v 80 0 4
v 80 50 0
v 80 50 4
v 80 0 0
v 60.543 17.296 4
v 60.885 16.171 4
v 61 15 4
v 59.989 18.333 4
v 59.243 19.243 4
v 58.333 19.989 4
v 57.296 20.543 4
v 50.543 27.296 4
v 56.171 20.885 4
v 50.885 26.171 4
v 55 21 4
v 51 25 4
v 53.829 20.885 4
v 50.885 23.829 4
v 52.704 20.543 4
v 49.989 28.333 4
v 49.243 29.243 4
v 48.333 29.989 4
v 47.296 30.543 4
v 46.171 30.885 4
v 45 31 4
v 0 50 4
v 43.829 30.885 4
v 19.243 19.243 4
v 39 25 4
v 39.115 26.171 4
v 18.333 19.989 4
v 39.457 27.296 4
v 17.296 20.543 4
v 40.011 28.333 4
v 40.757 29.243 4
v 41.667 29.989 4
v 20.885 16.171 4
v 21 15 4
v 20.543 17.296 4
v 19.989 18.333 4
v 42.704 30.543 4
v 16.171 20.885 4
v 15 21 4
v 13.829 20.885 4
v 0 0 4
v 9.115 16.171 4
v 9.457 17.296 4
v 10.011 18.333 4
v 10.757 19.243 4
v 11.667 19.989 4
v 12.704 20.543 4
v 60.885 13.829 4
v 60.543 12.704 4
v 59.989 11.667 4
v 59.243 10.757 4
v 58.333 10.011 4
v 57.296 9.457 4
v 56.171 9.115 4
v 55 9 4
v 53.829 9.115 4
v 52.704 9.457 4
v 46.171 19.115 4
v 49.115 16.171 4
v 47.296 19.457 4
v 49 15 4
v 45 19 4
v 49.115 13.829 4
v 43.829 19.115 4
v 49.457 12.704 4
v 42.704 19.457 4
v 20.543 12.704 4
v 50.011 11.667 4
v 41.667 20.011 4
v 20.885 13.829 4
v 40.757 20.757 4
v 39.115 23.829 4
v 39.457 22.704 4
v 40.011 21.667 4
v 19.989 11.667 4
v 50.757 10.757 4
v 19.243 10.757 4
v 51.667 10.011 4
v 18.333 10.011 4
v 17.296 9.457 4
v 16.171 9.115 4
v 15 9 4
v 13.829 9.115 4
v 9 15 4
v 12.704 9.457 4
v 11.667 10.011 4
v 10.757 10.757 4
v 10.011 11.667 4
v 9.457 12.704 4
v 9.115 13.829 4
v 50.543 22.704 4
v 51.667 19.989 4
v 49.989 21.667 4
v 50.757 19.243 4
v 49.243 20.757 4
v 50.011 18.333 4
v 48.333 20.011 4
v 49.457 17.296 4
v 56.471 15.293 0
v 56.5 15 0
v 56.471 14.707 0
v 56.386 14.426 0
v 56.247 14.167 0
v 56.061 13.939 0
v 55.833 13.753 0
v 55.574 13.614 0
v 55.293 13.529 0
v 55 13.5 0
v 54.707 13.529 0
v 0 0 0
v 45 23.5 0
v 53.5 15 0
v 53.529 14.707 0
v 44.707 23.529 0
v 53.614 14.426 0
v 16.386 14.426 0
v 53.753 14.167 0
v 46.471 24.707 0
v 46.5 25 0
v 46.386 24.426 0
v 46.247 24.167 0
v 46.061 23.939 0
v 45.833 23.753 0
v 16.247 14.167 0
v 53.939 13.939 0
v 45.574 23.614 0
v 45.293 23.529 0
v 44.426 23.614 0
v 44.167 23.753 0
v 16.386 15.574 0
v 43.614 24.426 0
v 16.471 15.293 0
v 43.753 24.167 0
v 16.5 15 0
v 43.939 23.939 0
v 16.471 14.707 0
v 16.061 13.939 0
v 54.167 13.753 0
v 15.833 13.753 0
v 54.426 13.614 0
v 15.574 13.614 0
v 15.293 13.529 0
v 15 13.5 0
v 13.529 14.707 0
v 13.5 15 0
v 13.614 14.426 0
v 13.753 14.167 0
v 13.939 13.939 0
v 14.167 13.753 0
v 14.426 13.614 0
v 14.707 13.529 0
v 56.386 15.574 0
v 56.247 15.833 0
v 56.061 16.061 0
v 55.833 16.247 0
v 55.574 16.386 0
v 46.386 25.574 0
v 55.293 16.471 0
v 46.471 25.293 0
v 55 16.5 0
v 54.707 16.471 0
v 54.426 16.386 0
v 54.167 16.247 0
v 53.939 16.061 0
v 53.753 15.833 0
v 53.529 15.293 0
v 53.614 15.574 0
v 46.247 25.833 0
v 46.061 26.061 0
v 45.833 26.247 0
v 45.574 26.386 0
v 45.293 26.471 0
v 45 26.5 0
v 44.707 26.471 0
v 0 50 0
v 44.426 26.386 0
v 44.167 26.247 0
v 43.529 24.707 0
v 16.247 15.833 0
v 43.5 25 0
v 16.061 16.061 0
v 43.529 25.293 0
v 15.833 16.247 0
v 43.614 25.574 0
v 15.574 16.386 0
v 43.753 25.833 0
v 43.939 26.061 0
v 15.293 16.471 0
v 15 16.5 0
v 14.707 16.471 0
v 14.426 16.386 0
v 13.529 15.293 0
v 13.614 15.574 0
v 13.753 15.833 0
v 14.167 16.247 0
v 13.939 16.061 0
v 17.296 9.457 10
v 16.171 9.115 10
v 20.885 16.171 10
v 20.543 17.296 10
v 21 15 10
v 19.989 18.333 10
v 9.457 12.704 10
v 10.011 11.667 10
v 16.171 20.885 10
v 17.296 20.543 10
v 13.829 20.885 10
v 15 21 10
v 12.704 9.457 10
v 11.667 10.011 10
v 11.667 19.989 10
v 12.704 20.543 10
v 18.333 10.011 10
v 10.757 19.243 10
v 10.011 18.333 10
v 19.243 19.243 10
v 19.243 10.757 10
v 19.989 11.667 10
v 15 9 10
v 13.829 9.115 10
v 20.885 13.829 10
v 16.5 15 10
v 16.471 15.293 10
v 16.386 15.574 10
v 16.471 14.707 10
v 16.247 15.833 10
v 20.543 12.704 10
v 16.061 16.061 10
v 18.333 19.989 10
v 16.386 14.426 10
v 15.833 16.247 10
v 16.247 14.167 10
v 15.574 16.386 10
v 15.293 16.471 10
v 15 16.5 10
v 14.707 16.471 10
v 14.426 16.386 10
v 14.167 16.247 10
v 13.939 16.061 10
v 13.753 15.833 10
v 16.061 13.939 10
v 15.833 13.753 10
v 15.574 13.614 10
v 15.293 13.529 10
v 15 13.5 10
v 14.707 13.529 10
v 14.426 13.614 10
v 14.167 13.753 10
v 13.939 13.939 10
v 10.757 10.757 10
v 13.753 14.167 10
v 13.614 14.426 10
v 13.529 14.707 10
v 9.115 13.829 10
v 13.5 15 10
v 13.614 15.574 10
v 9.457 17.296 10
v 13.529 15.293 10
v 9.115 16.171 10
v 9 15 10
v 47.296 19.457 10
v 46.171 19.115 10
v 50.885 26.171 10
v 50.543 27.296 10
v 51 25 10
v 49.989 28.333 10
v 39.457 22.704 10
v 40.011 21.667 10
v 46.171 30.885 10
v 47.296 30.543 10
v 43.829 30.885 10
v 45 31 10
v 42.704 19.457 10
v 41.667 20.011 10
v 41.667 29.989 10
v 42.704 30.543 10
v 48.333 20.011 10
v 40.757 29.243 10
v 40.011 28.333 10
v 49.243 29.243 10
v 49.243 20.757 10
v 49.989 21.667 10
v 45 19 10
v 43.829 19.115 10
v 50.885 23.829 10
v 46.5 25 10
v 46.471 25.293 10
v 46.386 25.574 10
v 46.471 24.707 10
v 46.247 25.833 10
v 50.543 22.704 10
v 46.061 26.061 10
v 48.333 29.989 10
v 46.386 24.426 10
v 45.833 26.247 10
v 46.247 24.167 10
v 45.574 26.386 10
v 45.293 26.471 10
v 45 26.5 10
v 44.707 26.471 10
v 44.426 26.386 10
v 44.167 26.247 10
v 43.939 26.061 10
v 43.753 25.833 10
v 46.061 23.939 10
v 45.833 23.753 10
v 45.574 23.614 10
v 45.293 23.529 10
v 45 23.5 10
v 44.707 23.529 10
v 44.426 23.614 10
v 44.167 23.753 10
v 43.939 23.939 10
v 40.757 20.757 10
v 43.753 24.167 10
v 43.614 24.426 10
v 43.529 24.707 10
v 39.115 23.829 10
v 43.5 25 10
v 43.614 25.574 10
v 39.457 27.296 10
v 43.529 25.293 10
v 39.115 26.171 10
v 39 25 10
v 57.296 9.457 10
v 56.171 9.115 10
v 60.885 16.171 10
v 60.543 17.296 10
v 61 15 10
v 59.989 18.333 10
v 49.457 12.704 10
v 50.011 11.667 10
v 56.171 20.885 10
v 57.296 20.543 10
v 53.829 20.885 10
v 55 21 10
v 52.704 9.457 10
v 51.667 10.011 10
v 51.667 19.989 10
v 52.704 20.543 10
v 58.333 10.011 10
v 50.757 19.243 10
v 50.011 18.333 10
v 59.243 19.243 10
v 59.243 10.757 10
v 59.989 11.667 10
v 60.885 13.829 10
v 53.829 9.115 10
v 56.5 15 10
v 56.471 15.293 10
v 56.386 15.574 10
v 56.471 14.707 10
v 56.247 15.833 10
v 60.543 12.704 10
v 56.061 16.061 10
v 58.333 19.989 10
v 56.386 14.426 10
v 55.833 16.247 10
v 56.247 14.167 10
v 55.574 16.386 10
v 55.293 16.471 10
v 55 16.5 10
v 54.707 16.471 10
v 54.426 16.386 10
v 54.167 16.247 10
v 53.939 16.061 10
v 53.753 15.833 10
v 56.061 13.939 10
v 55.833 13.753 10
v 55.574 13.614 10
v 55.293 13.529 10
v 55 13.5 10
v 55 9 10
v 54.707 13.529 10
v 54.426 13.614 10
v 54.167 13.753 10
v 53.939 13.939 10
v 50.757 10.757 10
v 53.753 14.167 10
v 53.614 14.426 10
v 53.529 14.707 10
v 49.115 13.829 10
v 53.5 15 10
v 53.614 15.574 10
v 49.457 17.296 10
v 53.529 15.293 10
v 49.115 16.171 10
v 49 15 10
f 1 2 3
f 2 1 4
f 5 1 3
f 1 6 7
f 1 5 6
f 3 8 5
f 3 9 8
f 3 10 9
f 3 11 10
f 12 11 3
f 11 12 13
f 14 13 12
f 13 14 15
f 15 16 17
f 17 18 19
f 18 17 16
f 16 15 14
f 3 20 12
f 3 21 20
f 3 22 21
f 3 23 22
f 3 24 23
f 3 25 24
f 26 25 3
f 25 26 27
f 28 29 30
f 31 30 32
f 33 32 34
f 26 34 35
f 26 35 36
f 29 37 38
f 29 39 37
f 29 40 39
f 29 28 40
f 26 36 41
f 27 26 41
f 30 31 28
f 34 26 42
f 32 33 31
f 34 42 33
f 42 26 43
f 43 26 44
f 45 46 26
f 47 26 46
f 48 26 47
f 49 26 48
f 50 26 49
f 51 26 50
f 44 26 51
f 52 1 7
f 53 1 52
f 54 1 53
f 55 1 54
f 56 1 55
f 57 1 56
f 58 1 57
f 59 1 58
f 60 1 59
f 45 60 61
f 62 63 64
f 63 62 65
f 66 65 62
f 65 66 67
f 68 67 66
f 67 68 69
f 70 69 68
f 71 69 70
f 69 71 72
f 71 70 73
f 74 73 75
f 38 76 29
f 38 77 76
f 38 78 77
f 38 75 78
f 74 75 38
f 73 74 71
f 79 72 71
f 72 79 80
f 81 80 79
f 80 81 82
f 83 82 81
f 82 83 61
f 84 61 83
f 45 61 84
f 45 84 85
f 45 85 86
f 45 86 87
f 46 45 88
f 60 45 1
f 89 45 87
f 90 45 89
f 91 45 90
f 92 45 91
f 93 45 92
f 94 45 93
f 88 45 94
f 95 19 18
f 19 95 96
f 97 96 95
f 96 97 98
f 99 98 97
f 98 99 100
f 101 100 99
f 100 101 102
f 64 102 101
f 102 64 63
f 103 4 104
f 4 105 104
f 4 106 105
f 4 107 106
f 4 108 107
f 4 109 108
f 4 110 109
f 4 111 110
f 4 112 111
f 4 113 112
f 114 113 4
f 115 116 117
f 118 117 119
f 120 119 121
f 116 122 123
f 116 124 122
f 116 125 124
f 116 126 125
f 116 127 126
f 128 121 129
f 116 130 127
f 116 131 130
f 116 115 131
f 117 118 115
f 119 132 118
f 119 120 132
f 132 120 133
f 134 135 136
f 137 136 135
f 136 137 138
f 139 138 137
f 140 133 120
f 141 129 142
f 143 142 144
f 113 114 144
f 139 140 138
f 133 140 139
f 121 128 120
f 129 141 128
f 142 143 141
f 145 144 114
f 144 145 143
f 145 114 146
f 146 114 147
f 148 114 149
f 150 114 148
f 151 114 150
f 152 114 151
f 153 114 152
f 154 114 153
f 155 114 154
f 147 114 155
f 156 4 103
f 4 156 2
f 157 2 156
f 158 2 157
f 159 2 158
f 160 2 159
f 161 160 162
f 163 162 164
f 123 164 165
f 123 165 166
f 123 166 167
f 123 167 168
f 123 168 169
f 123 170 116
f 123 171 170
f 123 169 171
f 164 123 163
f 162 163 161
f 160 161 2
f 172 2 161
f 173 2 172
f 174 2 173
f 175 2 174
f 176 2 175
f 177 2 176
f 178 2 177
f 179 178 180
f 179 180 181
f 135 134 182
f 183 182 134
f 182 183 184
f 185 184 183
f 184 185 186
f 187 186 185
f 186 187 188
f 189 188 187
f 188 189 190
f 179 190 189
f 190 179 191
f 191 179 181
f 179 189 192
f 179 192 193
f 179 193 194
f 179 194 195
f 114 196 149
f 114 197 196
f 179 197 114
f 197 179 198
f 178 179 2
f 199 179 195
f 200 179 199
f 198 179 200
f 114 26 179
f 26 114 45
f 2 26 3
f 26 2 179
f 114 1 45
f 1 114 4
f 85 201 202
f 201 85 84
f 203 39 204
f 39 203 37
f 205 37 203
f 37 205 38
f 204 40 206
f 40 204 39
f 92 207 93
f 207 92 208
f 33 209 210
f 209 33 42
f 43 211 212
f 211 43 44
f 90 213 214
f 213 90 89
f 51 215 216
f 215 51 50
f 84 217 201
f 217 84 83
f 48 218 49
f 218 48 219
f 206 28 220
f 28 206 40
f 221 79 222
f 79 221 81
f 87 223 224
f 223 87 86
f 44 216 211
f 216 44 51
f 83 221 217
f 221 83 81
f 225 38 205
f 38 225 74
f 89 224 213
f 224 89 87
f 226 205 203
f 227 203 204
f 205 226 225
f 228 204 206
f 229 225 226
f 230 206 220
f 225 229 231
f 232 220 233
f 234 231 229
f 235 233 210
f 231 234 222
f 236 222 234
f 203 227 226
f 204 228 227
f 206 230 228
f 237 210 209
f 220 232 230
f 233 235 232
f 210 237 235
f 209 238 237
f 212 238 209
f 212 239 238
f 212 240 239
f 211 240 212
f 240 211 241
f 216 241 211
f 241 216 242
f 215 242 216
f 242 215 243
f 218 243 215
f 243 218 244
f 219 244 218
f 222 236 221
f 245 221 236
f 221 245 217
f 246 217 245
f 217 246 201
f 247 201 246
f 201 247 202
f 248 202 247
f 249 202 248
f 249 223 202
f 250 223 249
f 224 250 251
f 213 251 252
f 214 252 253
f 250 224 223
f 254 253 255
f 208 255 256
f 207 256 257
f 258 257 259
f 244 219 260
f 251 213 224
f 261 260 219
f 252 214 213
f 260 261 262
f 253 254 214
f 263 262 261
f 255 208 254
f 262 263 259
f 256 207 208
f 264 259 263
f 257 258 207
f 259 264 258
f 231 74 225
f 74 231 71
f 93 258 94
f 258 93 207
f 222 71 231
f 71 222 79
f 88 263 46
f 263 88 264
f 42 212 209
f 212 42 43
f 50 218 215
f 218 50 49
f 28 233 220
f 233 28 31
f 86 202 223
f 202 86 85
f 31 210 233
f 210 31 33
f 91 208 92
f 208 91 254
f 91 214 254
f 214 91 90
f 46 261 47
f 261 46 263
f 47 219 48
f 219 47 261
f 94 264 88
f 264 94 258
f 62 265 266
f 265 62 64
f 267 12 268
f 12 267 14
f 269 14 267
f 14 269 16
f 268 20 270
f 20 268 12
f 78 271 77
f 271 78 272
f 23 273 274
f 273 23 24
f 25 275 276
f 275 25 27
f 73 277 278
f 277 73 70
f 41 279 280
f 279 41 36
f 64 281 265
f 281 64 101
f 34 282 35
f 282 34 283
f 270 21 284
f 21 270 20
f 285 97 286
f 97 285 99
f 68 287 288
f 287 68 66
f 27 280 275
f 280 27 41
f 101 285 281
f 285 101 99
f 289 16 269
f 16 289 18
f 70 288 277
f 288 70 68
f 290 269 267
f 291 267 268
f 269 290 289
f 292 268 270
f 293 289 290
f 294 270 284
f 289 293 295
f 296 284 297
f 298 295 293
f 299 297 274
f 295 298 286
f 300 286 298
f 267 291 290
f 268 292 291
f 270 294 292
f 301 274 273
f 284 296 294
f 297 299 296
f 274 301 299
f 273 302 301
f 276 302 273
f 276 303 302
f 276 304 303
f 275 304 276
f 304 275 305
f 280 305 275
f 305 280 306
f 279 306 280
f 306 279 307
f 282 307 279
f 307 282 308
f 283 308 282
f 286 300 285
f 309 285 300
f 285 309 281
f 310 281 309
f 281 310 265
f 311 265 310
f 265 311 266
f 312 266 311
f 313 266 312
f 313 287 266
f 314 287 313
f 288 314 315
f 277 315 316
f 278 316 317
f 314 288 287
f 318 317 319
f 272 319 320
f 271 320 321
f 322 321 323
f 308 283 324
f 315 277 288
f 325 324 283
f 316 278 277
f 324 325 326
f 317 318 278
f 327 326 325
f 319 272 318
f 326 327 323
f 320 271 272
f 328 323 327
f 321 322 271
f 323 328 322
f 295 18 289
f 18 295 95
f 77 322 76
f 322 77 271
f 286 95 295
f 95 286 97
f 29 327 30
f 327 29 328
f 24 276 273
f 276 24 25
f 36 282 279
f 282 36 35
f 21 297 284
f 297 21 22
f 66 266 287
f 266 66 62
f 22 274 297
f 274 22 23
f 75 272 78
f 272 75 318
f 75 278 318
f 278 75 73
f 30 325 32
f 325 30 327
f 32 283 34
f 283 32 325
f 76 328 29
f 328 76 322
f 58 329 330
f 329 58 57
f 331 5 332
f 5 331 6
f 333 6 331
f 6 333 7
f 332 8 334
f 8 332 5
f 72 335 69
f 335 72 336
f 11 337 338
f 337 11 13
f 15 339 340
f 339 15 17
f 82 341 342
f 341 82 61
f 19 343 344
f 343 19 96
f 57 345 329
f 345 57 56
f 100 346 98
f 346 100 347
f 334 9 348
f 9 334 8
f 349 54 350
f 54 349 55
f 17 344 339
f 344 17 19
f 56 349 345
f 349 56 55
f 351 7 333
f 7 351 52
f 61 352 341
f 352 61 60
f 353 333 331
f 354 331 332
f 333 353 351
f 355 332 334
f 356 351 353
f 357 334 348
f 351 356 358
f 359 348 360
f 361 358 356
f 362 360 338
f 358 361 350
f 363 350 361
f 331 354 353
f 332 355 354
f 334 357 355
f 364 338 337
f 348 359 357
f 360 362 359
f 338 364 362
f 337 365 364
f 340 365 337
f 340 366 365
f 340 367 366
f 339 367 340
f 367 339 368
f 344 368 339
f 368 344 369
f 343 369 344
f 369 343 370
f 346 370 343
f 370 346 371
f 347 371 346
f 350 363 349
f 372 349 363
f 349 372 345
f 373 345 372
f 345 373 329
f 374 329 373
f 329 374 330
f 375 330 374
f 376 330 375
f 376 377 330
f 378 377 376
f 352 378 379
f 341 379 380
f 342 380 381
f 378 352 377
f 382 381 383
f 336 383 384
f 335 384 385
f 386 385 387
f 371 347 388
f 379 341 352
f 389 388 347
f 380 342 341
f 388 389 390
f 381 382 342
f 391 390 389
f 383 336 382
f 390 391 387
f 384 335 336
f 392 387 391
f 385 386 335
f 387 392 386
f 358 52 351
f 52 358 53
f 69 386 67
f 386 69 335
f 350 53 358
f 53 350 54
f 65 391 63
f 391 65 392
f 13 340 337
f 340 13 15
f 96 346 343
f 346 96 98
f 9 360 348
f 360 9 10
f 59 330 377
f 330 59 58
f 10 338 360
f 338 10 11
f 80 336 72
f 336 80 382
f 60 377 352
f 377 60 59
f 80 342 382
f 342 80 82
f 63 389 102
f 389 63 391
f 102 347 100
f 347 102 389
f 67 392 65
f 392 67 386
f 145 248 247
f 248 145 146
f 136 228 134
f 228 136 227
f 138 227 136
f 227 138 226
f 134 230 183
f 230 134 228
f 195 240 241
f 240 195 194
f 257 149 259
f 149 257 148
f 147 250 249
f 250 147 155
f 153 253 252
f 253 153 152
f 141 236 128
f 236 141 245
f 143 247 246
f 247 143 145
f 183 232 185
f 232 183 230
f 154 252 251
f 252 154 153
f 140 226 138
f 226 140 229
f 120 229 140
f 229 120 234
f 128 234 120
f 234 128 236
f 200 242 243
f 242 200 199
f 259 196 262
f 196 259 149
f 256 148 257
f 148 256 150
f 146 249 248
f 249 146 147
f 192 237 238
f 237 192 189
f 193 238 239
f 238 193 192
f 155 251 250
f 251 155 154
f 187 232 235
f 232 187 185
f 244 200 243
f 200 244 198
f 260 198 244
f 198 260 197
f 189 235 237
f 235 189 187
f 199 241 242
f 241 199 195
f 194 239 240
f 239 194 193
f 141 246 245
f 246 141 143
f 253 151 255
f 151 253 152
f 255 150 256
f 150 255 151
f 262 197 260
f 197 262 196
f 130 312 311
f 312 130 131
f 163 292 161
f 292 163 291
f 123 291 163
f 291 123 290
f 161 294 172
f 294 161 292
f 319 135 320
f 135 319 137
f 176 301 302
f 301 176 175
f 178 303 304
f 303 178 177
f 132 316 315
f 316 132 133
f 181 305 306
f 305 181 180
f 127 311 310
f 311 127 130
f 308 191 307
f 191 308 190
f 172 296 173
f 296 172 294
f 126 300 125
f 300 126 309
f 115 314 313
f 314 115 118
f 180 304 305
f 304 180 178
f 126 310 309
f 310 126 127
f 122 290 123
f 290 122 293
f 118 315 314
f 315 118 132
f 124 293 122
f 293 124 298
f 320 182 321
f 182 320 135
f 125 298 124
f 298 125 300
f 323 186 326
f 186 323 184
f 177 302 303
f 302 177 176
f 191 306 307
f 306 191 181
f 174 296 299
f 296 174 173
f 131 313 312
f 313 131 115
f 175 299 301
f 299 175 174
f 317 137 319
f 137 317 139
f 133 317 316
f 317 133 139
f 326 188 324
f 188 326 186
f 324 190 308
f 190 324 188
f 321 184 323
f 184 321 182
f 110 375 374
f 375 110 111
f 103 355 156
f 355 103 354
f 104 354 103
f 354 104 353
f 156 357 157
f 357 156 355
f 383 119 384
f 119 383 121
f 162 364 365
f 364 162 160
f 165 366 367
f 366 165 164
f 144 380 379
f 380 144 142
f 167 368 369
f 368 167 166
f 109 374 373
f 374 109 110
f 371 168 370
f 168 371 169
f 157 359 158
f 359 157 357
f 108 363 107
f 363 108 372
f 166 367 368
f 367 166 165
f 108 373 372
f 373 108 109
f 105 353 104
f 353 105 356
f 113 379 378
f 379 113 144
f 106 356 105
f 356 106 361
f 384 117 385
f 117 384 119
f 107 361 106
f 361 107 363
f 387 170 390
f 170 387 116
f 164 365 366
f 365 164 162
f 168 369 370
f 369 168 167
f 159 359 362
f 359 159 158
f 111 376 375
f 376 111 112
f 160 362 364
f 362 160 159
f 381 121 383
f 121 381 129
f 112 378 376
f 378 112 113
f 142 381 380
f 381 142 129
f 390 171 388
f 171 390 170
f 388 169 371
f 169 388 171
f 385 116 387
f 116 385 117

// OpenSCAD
$fn = 32;

// ----------------------------------------------------------------------
// Boss field: plate with bosses at given coordinates
// ----------------------------------------------------------------------

// --- parameters (mm) ---
plate_l = 80;             // plate length, X
plate_w = 50;             // plate width, Y
plate_t = 4;              // plate thickness, Z
boss_d = 12;              // boss diameter
boss_h = 6;               // boss height above the plate
bore_d = 3;               // boss bore

total_h = plate_t + boss_h;  // overall height

difference() {
  union() {
    cube([plate_l, plate_w, plate_t]);
    translate([15, 15, plate_t]) cylinder(h = boss_h, d = boss_d);
    translate([45, 25, plate_t]) cylinder(h = boss_h, d = boss_d);
    translate([55, 15, plate_t]) cylinder(h = boss_h, d = boss_d);
  }
  translate([15, 15, -1]) cylinder(h = total_h + 2, d = bore_d);
  translate([45, 25, -1]) cylinder(h = total_h + 2, d = bore_d);
  translate([55, 15, -1]) cylinder(h = total_h + 2, d = bore_d);
}
